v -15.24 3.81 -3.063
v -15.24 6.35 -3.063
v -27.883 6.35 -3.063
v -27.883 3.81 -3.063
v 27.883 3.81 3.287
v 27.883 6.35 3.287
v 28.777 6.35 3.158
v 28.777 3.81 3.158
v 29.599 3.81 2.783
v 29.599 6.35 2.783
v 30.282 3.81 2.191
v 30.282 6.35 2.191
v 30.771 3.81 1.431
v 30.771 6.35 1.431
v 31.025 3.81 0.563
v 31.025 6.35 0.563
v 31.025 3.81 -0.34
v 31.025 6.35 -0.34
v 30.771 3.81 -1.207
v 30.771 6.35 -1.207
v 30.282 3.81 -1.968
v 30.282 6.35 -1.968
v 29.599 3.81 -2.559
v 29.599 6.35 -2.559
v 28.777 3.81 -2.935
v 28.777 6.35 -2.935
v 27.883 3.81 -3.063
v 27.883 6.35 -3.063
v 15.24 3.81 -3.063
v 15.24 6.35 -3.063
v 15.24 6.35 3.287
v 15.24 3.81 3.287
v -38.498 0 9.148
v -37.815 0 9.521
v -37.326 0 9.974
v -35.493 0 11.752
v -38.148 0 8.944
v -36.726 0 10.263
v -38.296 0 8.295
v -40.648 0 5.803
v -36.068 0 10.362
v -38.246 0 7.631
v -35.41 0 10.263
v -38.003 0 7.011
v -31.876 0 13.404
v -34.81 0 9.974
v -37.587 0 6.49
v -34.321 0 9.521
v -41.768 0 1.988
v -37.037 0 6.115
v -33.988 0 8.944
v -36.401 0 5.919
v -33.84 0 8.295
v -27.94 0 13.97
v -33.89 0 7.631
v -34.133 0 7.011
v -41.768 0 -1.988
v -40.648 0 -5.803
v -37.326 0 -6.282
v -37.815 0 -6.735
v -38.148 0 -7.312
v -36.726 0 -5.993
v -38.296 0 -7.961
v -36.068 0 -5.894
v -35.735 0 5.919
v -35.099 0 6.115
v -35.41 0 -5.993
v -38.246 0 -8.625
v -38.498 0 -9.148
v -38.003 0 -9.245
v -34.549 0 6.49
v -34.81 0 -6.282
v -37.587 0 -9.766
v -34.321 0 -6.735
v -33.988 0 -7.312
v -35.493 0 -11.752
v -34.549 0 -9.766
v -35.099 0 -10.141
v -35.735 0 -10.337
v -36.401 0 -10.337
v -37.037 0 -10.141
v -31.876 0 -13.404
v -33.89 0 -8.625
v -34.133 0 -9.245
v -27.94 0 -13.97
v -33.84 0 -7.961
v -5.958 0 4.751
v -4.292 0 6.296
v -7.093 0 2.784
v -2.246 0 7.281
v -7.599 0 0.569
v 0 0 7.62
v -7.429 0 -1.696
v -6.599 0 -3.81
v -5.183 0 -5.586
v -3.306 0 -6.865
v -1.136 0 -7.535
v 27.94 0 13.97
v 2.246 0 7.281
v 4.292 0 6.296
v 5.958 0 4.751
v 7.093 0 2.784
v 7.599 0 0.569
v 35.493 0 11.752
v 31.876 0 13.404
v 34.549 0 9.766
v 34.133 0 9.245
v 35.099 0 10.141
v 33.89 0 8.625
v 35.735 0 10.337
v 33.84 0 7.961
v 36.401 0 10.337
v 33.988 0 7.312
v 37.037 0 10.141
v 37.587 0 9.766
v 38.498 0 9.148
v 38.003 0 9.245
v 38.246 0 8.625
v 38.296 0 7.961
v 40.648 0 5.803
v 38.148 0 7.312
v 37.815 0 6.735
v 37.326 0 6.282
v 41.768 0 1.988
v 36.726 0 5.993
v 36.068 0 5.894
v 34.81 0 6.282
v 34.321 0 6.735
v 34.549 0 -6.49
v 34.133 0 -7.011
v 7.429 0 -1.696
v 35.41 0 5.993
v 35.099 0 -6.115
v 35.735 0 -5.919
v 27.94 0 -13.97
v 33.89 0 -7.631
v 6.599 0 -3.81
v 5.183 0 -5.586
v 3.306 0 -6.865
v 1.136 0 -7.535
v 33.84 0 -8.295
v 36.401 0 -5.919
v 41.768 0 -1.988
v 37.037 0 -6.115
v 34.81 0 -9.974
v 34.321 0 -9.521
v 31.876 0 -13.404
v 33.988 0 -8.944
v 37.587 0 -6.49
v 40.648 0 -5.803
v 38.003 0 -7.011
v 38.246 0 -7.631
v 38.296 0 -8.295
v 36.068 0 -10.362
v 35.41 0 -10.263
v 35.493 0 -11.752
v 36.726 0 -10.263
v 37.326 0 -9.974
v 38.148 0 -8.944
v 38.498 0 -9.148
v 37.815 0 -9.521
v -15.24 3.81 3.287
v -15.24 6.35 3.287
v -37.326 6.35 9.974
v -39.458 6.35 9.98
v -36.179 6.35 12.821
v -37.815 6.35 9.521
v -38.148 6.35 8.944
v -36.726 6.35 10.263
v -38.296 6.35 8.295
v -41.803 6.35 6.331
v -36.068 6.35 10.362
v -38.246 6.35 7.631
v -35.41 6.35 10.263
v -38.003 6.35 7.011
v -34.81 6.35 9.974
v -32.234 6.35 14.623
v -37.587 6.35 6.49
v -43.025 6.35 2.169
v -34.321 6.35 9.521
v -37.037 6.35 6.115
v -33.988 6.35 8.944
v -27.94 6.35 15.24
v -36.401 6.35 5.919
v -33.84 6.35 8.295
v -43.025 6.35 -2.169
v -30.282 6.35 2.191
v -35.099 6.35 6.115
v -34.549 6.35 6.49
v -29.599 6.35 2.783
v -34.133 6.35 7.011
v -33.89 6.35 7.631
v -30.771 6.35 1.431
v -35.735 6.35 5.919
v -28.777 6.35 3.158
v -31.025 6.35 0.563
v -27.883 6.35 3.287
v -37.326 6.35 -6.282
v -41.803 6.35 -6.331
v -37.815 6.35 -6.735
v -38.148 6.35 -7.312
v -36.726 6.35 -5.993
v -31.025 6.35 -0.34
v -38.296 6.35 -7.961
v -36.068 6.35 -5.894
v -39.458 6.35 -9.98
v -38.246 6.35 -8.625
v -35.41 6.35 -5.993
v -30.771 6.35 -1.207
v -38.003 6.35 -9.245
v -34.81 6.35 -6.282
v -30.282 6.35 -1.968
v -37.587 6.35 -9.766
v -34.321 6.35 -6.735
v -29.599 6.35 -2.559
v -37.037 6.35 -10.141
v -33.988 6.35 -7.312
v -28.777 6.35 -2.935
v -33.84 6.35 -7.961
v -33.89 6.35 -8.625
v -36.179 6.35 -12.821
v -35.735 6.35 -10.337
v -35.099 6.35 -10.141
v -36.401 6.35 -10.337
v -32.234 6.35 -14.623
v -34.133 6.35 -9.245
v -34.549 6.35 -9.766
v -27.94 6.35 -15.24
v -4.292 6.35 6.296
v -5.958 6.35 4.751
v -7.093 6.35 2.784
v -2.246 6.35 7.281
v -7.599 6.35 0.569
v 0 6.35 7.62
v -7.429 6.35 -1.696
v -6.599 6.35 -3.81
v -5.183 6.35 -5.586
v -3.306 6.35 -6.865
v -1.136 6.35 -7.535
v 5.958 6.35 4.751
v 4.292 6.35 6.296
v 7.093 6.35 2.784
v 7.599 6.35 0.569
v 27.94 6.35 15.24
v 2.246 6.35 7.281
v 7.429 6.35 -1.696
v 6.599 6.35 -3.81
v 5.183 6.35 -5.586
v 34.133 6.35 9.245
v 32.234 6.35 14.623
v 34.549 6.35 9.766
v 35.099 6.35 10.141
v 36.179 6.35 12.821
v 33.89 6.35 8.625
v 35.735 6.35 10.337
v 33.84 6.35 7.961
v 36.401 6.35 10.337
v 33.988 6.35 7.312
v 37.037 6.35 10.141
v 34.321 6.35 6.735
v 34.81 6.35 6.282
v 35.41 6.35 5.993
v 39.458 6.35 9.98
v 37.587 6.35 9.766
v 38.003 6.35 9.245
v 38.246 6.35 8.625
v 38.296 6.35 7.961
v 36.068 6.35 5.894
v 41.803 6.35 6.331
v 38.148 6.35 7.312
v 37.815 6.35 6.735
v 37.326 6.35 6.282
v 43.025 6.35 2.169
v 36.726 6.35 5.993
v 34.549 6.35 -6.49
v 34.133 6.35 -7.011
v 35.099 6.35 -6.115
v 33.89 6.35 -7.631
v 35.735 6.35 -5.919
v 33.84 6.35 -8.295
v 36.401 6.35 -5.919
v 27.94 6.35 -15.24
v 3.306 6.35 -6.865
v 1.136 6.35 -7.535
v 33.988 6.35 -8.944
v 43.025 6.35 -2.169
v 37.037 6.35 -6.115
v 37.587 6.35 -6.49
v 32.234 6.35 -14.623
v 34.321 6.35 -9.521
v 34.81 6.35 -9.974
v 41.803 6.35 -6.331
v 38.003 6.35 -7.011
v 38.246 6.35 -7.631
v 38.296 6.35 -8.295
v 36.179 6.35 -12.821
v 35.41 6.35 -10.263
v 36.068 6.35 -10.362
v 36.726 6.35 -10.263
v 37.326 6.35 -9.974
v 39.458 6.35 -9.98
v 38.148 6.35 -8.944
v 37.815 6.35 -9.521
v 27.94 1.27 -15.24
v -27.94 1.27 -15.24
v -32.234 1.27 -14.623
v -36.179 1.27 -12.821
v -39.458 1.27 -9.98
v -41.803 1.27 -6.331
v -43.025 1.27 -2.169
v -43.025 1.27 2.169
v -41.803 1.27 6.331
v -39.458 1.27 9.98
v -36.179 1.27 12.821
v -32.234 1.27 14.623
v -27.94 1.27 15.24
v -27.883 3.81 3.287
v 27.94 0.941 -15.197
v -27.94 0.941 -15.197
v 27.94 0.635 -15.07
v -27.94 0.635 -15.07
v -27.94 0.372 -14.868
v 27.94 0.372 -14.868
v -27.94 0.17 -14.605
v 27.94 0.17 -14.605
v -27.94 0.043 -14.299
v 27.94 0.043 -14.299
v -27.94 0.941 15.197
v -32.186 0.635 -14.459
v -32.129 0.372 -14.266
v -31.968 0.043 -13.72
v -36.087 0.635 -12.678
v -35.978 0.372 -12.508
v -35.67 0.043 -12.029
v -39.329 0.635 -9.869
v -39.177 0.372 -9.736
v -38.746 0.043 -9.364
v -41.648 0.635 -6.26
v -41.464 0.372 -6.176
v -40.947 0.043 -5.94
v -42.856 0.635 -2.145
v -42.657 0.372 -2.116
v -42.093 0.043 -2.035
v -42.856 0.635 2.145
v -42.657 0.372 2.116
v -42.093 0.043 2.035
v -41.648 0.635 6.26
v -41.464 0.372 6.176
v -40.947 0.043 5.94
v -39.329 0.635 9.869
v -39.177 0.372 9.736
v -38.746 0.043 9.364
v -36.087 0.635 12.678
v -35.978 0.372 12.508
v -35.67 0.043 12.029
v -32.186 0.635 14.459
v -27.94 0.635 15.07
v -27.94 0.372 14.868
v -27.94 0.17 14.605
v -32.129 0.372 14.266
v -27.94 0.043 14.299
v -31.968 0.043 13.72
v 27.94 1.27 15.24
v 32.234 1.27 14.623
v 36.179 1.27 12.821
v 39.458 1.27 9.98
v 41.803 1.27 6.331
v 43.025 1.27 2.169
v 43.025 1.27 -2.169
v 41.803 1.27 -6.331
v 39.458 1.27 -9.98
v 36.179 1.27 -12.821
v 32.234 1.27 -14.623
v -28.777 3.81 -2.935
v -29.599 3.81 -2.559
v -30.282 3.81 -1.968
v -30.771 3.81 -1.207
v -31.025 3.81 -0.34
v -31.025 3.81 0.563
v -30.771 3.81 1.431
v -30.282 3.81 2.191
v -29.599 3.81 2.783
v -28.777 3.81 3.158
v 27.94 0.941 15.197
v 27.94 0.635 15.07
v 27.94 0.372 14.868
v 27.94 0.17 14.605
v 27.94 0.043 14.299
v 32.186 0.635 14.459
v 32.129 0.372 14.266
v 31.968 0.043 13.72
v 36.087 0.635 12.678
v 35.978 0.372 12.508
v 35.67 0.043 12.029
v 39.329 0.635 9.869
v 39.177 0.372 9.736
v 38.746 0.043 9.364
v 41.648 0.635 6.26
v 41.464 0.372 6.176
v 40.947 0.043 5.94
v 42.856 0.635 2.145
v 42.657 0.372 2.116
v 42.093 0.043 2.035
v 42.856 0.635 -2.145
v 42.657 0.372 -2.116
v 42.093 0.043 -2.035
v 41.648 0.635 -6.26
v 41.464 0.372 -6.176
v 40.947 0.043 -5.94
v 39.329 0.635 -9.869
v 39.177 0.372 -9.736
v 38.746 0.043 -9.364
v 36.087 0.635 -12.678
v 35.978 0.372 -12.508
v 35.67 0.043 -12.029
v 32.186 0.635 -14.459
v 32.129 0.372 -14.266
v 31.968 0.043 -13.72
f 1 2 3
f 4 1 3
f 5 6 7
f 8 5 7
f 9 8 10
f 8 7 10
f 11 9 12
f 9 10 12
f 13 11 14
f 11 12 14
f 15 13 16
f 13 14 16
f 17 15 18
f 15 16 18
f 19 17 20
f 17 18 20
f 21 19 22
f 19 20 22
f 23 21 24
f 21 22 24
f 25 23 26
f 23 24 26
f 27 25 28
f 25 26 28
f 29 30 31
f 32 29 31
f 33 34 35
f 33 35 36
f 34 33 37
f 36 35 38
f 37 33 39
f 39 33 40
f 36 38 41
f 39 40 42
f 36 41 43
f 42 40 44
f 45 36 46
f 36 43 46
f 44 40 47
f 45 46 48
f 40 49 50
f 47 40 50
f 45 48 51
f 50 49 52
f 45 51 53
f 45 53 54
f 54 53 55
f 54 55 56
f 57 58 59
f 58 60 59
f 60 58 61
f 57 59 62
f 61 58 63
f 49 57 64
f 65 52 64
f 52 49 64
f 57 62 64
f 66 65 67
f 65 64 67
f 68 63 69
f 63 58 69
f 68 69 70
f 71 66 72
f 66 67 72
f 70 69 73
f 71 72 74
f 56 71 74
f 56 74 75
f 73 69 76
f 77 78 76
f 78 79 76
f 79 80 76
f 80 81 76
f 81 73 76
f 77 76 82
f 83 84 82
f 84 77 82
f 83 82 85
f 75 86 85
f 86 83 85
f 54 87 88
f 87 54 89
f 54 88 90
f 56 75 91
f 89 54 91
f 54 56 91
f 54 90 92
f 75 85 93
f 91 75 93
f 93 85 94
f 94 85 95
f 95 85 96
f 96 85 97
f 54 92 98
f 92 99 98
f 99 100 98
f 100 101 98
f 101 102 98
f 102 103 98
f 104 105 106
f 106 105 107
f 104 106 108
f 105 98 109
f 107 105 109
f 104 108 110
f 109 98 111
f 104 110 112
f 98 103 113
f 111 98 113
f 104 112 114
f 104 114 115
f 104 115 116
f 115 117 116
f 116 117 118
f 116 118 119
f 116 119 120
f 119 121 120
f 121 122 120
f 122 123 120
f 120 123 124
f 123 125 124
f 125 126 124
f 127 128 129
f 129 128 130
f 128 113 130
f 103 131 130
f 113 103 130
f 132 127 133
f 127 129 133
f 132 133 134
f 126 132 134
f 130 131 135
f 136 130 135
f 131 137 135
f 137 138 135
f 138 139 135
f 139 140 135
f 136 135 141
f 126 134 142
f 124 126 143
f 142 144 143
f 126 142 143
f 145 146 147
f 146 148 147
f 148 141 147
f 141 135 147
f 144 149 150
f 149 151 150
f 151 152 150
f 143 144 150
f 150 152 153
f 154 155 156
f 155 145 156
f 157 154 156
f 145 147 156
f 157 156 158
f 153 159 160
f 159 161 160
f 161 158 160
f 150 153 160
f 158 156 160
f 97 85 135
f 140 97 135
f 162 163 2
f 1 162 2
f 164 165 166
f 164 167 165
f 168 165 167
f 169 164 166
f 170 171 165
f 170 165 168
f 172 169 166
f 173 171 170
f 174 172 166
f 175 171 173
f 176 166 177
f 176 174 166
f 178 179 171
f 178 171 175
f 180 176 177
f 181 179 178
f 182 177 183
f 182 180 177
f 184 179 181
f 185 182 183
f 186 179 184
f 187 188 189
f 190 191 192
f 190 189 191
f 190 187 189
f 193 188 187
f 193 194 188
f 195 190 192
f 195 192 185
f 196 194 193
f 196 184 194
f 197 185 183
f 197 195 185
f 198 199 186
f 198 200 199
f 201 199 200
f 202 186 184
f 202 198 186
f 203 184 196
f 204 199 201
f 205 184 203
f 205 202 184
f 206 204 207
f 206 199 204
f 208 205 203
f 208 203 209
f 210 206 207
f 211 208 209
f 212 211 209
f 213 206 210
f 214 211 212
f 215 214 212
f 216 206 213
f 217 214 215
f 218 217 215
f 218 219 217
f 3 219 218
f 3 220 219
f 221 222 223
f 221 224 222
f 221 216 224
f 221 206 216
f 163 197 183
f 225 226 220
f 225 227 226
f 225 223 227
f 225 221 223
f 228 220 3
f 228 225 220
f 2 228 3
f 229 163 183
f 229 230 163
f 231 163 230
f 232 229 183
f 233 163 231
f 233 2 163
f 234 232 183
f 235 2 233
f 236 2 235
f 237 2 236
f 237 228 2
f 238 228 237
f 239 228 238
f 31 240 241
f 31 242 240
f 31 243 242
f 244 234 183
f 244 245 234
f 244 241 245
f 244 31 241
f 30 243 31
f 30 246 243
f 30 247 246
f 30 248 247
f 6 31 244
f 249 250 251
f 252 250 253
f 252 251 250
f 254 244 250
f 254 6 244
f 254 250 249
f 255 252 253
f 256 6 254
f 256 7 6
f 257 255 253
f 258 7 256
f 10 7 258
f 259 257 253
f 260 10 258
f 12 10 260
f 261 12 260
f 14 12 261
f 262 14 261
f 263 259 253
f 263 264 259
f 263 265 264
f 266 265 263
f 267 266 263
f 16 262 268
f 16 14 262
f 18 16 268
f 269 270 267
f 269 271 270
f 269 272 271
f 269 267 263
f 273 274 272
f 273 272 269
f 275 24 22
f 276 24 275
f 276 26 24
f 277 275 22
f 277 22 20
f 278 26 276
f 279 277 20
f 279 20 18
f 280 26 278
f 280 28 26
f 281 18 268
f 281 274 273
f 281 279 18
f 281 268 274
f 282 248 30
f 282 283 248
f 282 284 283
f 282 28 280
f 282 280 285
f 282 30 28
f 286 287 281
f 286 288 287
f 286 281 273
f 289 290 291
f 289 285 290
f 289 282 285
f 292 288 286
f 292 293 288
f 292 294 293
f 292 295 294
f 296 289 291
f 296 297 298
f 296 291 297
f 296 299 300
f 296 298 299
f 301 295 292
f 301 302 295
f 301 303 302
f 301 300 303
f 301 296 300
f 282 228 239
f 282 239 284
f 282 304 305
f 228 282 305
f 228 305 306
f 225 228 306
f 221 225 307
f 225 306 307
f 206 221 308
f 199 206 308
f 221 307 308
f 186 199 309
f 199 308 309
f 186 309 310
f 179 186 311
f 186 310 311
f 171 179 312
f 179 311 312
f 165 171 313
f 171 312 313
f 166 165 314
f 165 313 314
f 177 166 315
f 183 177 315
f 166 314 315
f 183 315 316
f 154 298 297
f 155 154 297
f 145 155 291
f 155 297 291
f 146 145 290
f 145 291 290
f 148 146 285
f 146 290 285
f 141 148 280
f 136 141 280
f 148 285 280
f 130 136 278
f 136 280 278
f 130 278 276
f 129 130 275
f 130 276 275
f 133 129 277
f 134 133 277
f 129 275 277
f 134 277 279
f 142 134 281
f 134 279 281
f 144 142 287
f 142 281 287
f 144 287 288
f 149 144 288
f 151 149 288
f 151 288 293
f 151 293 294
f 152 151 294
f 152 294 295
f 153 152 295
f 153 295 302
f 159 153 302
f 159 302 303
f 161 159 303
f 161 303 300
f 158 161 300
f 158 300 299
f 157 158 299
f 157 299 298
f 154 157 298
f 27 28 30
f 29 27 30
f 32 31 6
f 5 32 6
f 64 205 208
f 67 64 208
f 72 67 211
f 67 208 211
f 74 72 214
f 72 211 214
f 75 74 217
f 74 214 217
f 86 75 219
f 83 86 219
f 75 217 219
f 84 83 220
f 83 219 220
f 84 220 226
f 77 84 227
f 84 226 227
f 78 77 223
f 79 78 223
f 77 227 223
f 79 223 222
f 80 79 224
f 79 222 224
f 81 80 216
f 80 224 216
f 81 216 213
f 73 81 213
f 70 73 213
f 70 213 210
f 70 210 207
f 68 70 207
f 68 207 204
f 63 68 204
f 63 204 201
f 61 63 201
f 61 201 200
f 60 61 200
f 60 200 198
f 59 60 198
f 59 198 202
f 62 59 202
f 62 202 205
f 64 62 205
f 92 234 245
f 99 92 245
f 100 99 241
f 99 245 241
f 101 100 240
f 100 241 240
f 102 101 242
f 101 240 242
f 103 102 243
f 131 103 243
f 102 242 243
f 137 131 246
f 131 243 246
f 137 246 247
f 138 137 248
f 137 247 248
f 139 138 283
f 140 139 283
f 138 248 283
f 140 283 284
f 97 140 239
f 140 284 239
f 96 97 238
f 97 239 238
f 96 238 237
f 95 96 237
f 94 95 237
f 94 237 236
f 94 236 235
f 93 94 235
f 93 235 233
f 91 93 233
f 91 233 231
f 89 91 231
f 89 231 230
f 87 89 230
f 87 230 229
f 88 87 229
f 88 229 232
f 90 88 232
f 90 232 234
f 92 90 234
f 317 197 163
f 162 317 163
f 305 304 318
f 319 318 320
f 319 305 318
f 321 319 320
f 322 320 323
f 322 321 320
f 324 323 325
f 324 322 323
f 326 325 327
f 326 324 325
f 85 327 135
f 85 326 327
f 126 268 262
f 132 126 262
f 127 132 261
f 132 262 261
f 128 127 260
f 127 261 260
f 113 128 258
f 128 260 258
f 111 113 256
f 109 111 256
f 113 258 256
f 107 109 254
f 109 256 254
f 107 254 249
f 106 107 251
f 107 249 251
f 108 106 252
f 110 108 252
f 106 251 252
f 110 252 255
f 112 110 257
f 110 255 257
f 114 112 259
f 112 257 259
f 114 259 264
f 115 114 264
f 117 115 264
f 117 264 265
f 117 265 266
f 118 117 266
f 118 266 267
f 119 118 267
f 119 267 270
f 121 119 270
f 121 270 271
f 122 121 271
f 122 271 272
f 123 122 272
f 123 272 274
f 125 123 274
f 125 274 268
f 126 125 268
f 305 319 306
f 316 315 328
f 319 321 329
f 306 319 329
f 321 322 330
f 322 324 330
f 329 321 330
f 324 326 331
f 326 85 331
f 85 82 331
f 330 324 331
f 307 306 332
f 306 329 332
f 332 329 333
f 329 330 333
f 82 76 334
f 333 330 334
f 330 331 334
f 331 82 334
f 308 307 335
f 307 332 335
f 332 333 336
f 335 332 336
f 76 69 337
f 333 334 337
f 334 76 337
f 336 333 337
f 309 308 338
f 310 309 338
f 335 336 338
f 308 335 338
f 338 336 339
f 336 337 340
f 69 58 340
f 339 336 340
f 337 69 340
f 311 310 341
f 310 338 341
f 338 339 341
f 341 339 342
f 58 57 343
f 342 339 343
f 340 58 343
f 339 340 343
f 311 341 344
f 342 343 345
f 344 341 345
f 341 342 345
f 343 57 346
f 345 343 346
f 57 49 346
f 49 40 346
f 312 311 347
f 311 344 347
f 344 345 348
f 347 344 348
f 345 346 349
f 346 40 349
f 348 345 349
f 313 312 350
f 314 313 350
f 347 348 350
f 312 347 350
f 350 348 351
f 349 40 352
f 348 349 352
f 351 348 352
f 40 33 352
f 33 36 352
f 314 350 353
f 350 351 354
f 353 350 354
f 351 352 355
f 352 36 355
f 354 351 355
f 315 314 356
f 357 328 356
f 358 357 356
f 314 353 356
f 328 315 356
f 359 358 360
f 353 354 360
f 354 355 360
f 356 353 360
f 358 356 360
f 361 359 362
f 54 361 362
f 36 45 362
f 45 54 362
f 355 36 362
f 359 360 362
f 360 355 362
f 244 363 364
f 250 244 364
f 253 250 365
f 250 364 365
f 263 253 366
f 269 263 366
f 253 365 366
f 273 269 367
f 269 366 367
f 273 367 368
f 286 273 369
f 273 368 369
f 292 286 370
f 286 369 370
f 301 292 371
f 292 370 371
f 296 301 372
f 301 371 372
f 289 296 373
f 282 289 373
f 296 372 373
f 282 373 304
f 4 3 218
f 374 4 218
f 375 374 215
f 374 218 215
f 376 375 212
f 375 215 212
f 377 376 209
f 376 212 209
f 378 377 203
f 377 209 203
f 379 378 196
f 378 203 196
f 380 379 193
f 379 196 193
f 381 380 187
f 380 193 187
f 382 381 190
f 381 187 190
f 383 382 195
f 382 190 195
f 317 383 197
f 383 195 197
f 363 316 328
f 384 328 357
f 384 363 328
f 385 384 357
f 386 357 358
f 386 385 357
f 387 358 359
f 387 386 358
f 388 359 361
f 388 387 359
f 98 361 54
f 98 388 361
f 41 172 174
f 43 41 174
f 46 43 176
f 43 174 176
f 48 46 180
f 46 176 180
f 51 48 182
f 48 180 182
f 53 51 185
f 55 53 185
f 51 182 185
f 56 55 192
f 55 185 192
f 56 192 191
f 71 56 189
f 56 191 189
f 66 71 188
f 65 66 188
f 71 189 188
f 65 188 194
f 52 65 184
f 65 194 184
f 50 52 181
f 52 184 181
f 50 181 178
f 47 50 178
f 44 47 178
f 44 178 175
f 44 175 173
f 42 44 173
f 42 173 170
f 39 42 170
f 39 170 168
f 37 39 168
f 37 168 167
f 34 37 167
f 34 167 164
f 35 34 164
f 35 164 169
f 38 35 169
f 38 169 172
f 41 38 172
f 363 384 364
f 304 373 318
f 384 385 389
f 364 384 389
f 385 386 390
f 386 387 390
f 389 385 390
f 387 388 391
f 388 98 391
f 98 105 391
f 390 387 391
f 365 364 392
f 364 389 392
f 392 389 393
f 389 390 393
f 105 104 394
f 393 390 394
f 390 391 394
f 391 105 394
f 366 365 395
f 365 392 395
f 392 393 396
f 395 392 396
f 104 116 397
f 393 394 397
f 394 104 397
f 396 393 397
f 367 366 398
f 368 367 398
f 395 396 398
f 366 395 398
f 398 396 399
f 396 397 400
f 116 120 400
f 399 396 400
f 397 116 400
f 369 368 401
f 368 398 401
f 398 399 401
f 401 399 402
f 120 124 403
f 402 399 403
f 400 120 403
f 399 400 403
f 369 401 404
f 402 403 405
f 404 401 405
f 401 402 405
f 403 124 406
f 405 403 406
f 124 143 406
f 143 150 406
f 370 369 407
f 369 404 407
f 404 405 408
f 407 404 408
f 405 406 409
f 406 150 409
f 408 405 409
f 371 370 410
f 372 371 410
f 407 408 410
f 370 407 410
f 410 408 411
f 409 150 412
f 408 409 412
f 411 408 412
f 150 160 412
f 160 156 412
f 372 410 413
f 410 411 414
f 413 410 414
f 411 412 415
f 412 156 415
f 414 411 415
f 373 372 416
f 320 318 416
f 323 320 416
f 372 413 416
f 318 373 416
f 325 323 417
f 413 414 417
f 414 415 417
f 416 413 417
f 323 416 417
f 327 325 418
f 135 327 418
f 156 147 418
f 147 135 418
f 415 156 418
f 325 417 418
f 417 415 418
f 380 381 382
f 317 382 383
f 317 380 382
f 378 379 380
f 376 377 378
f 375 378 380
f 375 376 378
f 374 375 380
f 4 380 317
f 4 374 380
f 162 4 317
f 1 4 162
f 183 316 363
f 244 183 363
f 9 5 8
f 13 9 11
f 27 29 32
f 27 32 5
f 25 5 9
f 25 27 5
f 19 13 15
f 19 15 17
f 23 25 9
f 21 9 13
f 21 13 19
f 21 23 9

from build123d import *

# Parameters (mm, degrees)
BOSS_EXTRUDE1_DEPTH = 6.35
CUT_EXTRUDE1_DEPTH  = 2.54
SKETCH3_R           = 7.62
CUT_EXTRUDE2_DEPTH  = 47.228697797
FILLET1_R           = 1.27
SKETCH4_R           = 2.23393
CUT_EXTRUDE3_DEPTH  = 47.228697923


with BuildPart() as part:
    # Sketch1 → Boss-Extrude1 (new body)
    with BuildSketch(Plane(origin=(0, 0, 0), x_dir=(1, 0, 0), z_dir=(0, 1, 0))):
        with BuildLine():
            Line((27.94, 15.24), (-27.94, 15.24))
            ThreePointArc((-27.94, 15.24), (-43.18, 0), (-27.94, -15.24))
            Line((-27.94, -15.24), (27.94, -15.24))
            ThreePointArc((27.94, -15.24), (43.18, 0), (27.94, 15.24))
        make_face()
    extrude(amount=BOSS_EXTRUDE1_DEPTH)

    # Sketch2 → Cut-Extrude1 (cut)
    with BuildSketch(Plane(origin=(0, 6.35, 0), x_dir=(1, 0, 0), z_dir=(0, 1, 0))):
        with BuildLine():
            Line((-15.24, 3.063440359), (-27.882747925, 3.063440359))
            ThreePointArc((-27.882747925, 3.063440359), (-31.057747925, -0.111559641), (-27.882747925, -3.286559641))
            Line((-27.882747925, -3.286559641), (-15.24, -3.286559641))
            Line((-15.24, -3.286559641), (-15.24, 3.063440359))
        make_face()
        with BuildLine():
            Line((15.24, 3.063440359), (15.24, -3.286559641))
            Line((15.24, -3.286559641), (27.882747925, -3.286559641))
            ThreePointArc((27.882747925, -3.286559641), (31.057747925, -0.111559641), (27.882747925, 3.063440359))
            Line((27.882747925, 3.063440359), (15.24, 3.063440359))
        make_face()
    extrude(amount=-CUT_EXTRUDE1_DEPTH, mode=Mode.SUBTRACT)

    # Sketch3 → Cut-Extrude2 (cut, through all)
    with BuildSketch(Plane(origin=(0, 6.35, 0), x_dir=(1, 0, 0), z_dir=(0, 1, 0))):
        with Locations(Location((0, 0, 0), (0, 0, 270))):
            Circle(SKETCH3_R)
    extrude(amount=-CUT_EXTRUDE2_DEPTH, mode=Mode.SUBTRACT)

    # Fillet1
    fillet1_edges = [part.edges().sort_by_distance(p)[0] for p in [
        (0, 0, -15.24),
        (43.18, 0, 0),
        (0, 0, 15.24),
        (-43.18, 0, 0),
    ]]
    fillet(fillet1_edges, radius=FILLET1_R)

    # Sketch4 → Cut-Extrude3 (cut, through all)
    with BuildSketch(Plane(origin=(0, 6.35, 0), x_dir=(1, 0, 0), z_dir=(0, 1, 0))):
        with Locations(Location((-36.068, 8.128, 0), (0, 0, 270))):
            Circle(SKETCH4_R)
        with Locations(Location((-36.068, -8.128, 0), (0, 0, 270))):
            Circle(SKETCH4_R)
        with Locations(Location((36.068, 8.128, 0), (0, 0, 90))):
            Circle(SKETCH4_R)
        with Locations(Location((36.068, -8.128, 0), (0, 0, 90))):
            Circle(SKETCH4_R)
    extrude(amount=-CUT_EXTRUDE3_DEPTH, mode=Mode.SUBTRACT)


solid = part.part
